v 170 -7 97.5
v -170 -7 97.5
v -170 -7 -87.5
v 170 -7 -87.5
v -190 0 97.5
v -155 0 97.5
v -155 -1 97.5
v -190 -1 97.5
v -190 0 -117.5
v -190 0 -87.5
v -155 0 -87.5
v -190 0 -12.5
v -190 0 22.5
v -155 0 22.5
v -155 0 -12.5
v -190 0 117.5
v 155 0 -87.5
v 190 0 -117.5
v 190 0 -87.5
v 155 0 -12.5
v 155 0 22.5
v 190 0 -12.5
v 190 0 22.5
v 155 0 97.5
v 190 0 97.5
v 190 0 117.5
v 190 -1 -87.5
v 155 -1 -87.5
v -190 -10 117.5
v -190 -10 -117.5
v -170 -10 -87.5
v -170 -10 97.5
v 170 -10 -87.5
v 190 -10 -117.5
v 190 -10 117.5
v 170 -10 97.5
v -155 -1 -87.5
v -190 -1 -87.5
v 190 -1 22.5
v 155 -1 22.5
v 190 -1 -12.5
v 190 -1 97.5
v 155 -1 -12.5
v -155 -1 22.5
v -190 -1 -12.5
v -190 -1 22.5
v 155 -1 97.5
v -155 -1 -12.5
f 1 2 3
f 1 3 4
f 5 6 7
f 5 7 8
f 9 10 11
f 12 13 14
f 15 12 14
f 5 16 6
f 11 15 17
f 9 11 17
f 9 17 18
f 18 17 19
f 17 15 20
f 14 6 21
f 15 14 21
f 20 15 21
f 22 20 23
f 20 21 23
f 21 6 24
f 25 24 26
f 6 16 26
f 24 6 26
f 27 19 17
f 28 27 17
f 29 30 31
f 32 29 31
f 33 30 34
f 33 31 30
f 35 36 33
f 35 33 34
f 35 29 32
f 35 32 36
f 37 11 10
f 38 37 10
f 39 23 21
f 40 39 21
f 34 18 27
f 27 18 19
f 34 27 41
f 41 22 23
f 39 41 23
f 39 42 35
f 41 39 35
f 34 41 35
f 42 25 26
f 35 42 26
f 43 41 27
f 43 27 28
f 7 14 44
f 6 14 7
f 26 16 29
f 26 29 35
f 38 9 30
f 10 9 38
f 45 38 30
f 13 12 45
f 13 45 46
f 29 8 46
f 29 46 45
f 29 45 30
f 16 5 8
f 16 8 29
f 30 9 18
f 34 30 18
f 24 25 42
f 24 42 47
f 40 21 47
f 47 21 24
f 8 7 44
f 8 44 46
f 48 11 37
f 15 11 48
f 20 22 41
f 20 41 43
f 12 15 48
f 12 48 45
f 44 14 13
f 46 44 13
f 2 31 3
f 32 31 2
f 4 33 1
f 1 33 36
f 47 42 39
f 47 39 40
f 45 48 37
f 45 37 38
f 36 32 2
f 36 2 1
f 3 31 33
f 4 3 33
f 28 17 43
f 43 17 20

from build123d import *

# Parameters (mm, degrees)
F0_W     = 380
F0_H     = 235
F1_DEPTH = 10
F2_W     = 340
F2_H     = 185
F3_DEPTH = 3
F4_W     = 35
F4_H     = 75
F5_DEPTH = 1


with BuildPart() as f1:
    # F0 (on Front) → F1 (new body)
    with BuildSketch(Plane.XZ):
        Rectangle(F0_W, F0_H)
    extrude(amount=F1_DEPTH)

    # F2 (on face) → F3 (cut)
    with BuildSketch(Plane.XZ.offset(10)):
        with Locations((0, 5)):
            Rectangle(F2_W, F2_H)
    extrude(amount=-F3_DEPTH, mode=Mode.SUBTRACT)

    # F4 (on face) → F5 (cut)
    with BuildSketch(Plane(origin=(0, 0, 0), x_dir=(-1, 0, 0), z_dir=(0, 1, 0))):
        with Locations((-172.5, 60)):
            Rectangle(F4_W, F4_H)
        with Locations((-172.5, -50)):
            Rectangle(F4_W, F4_H)
        with Locations((172.5, -50)):
            Rectangle(F4_W, F4_H)
        with Locations((172.5, 60)):
            Rectangle(F4_W, F4_H)
    extrude(amount=-F5_DEPTH, mode=Mode.SUBTRACT)


solid = f1.part
